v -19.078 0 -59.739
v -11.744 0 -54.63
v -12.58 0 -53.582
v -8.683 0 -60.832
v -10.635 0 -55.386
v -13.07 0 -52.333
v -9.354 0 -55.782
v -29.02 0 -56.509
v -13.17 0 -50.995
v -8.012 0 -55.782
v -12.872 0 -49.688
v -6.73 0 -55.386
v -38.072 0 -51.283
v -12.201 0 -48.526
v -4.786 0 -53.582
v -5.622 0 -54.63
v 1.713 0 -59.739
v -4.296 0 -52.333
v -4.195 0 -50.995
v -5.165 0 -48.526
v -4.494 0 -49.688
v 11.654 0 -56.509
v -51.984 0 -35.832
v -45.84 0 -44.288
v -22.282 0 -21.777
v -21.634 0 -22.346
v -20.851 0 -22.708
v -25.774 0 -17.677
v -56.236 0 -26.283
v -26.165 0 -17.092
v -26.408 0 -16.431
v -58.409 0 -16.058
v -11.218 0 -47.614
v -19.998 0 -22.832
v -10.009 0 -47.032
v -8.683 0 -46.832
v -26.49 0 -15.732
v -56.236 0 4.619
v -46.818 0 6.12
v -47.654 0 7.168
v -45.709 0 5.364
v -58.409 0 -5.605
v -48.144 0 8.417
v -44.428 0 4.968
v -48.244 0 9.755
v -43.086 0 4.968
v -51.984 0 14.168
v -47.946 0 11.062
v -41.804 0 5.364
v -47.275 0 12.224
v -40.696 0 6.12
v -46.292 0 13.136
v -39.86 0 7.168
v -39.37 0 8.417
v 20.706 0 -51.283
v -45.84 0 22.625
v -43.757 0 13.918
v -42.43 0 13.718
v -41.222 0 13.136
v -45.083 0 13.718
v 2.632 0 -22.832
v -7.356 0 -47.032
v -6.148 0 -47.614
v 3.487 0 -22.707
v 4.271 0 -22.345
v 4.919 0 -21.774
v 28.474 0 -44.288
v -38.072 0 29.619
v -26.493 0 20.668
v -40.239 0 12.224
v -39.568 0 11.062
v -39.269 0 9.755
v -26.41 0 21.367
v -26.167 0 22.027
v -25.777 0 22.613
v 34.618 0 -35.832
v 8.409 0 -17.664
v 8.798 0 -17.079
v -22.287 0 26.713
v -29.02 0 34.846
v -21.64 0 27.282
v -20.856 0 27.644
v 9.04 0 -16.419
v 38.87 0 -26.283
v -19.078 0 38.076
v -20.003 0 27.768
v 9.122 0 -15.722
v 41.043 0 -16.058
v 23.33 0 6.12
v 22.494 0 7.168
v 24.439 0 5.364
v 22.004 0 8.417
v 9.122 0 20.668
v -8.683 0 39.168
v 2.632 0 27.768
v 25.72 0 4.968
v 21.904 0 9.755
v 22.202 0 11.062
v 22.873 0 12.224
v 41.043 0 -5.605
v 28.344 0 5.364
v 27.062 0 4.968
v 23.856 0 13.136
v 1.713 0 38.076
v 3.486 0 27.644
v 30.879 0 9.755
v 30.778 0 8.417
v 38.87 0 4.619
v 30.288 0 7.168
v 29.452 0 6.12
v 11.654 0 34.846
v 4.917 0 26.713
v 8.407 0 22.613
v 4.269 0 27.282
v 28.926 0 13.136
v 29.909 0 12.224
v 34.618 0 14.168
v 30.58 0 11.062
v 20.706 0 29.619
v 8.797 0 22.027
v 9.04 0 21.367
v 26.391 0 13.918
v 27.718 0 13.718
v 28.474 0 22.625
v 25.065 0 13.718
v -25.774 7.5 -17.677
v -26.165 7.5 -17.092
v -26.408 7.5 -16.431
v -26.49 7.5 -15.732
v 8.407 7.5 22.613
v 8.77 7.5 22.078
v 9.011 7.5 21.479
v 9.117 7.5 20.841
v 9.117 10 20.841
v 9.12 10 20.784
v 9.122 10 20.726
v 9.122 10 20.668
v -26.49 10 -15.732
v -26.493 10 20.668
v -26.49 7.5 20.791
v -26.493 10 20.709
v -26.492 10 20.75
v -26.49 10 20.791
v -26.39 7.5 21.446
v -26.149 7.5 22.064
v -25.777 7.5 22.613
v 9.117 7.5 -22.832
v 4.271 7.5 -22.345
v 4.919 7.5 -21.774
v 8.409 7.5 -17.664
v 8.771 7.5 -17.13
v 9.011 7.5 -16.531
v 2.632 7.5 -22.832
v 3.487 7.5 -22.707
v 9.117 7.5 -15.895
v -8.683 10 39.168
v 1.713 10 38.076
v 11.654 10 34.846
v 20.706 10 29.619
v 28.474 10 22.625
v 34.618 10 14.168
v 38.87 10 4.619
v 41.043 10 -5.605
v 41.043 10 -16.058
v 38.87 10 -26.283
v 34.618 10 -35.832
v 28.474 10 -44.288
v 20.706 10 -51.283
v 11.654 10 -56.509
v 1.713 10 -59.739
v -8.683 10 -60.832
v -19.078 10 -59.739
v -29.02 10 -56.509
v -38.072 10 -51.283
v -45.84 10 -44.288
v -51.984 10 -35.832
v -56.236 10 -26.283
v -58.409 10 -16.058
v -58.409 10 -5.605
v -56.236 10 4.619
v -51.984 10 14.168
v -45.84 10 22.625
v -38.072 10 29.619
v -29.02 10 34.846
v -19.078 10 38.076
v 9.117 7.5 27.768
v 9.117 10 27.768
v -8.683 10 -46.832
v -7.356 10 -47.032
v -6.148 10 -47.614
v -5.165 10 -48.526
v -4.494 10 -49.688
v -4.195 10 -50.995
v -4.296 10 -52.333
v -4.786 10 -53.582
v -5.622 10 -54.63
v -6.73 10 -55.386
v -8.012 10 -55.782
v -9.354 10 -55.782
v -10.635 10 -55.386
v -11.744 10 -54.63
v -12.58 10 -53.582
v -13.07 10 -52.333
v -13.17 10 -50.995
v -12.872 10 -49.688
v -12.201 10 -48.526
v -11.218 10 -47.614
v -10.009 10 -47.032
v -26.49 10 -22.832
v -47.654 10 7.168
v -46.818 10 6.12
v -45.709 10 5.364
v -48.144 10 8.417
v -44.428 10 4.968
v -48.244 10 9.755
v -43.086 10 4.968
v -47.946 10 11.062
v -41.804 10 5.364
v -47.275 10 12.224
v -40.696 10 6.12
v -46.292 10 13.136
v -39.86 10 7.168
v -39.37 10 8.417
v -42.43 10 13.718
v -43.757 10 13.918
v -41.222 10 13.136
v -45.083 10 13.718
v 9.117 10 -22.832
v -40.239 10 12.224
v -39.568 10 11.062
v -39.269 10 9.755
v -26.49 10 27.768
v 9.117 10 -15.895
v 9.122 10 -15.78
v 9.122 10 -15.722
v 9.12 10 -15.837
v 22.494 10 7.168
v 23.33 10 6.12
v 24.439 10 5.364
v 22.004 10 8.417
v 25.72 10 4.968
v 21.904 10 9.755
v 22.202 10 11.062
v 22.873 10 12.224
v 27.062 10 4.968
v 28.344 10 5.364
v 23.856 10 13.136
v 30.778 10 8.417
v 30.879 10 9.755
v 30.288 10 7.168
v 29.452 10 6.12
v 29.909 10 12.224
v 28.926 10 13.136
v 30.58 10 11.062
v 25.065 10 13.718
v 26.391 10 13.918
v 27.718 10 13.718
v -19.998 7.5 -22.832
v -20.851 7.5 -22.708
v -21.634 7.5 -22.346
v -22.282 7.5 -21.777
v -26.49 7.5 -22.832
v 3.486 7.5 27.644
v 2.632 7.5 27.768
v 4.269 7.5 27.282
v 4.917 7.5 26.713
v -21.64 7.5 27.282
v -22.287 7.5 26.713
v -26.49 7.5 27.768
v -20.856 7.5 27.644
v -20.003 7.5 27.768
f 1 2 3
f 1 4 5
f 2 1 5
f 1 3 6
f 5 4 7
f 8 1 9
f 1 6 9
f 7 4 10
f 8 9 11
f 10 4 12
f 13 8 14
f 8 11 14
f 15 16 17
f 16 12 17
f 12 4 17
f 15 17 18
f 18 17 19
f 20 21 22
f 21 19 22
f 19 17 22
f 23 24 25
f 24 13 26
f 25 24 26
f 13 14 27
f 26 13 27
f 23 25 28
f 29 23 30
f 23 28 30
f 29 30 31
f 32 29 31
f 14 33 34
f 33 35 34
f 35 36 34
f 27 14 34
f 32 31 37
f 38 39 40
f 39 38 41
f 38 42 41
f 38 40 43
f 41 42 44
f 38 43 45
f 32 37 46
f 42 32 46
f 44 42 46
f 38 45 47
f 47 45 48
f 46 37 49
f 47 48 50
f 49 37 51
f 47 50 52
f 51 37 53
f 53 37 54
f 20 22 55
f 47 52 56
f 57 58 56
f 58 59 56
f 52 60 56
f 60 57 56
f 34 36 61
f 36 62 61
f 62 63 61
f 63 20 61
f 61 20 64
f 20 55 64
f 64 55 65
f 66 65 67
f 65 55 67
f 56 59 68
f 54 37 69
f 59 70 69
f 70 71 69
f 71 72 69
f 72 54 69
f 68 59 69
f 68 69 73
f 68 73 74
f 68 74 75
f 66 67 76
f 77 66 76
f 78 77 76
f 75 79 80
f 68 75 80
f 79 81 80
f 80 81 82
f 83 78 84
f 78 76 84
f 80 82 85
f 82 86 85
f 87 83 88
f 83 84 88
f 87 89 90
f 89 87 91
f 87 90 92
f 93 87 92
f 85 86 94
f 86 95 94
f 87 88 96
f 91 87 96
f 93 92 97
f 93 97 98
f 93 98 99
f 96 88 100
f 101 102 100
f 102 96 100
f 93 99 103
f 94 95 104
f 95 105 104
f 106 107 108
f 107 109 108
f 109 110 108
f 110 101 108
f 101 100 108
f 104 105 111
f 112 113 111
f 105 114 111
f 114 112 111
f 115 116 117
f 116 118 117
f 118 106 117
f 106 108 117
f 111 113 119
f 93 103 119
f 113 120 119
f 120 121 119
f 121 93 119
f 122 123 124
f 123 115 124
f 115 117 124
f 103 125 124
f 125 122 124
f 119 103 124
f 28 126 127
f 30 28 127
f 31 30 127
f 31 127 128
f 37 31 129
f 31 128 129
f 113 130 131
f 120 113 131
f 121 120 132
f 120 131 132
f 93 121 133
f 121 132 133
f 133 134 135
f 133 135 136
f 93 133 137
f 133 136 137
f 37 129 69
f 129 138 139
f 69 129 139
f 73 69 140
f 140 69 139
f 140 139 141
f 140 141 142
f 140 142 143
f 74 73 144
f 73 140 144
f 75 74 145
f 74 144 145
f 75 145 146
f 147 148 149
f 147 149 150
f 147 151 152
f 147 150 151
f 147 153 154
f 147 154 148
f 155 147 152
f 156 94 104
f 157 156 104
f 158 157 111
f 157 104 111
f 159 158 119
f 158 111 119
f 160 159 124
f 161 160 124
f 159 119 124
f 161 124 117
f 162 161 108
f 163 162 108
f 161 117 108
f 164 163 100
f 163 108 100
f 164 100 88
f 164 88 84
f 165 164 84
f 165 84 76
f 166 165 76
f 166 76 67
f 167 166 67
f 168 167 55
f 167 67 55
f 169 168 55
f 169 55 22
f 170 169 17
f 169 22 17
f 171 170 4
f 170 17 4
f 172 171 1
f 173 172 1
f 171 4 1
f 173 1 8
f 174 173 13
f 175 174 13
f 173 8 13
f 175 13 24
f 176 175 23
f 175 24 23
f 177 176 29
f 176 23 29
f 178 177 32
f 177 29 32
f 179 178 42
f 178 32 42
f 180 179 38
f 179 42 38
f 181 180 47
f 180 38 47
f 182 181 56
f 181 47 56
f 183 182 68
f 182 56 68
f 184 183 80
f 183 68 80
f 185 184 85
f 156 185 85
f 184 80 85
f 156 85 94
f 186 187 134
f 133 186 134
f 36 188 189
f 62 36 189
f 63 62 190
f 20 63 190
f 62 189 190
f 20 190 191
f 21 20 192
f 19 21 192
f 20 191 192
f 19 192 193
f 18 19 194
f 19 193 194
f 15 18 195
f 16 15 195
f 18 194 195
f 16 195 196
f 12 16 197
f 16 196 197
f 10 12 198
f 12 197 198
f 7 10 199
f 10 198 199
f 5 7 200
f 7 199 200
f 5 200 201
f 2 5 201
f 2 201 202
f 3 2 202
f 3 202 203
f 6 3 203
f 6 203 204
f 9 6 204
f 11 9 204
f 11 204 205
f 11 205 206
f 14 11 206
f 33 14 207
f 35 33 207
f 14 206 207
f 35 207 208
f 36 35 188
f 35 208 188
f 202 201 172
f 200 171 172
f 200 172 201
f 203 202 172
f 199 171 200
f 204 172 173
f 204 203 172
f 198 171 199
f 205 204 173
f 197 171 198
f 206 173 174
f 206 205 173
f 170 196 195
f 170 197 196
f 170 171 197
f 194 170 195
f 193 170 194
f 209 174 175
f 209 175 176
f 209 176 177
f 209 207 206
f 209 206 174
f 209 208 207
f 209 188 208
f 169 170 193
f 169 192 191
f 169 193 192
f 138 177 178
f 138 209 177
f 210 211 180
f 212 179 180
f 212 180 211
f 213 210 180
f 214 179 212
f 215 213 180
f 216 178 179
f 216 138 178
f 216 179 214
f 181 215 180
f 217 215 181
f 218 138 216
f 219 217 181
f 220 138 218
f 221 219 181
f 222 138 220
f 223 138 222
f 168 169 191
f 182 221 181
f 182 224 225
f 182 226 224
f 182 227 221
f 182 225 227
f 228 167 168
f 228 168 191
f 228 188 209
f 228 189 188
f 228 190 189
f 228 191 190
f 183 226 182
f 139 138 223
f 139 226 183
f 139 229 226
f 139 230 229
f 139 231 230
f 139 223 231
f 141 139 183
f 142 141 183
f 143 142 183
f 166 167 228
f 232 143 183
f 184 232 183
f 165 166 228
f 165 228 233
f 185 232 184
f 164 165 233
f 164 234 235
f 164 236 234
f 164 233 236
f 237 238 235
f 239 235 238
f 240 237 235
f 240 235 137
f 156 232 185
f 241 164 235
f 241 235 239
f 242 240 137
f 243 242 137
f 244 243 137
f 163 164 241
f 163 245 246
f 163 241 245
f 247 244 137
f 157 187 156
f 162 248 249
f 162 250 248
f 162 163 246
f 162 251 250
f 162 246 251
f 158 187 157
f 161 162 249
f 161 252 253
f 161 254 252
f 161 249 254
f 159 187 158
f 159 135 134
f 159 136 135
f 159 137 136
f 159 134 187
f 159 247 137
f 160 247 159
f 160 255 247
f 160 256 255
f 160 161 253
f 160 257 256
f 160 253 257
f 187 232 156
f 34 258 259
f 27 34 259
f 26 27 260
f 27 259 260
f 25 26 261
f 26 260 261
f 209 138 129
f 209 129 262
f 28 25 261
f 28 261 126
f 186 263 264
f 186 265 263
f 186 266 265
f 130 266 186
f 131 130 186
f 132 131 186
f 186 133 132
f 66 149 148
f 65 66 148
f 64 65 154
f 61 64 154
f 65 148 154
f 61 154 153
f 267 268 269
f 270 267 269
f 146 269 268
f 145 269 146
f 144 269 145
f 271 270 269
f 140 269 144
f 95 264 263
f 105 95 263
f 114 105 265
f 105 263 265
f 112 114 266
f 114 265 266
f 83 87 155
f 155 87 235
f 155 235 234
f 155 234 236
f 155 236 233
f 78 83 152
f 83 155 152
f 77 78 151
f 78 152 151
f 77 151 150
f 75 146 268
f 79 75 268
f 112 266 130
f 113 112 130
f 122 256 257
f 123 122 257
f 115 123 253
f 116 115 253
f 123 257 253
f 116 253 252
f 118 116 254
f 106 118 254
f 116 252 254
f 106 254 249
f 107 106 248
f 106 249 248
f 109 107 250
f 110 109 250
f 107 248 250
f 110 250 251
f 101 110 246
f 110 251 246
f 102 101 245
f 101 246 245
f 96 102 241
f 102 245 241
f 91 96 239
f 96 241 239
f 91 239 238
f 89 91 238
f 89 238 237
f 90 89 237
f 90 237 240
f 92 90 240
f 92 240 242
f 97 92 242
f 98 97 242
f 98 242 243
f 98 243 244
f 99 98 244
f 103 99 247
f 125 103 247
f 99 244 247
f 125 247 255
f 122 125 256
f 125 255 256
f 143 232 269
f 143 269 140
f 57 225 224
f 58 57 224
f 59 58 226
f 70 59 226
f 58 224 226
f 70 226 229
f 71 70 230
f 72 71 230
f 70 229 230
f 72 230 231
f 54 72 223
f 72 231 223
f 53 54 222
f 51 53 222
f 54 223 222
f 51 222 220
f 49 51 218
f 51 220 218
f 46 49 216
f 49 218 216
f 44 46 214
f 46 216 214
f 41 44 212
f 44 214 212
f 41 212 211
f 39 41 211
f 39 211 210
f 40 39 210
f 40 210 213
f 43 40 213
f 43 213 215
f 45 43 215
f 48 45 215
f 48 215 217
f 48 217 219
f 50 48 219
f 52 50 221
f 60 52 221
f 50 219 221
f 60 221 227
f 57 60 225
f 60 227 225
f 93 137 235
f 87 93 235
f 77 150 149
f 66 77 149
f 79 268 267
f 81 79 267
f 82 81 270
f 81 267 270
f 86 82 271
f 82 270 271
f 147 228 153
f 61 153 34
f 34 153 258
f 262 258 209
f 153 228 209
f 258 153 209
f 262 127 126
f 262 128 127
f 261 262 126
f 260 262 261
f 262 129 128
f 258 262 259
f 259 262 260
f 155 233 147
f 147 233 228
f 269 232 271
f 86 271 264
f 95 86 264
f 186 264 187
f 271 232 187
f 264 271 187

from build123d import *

# Parameters (mm, degrees)
SKETCH1_R           = 50
BOSS_EXTRUDE1_DEPTH = 10
CUT_EXTRUDE1_DEPTH  = 35
SKETCH5_W           = 35.6075
SKETCH5_H           = 50.6
CUT_EXTRUDE2_DEPTH  = 2.5
SKETCH7_R           = 4.5
CUT_EXTRUDE3_DEPTH  = 10
SKETCH7_3_R         = 4.5
CUT_EXTRUDE4_DEPTH  = 10
SKETCH7_4_R         = 4.5
CUT_EXTRUDE5_DEPTH  = 10


with BuildPart() as part:
    # Sketch1 → Boss-Extrude1 (new body)
    with BuildSketch(Plane(origin=(0, 0, 0), x_dir=(1, 0, 0), z_dir=(0, 1, 0))):
        with Locations((-8.682864084, 10.831764098)):
            Circle(SKETCH1_R)
    extrude(amount=BOSS_EXTRUDE1_DEPTH)

    # Sketch2 → Cut-Extrude1 (cut)
    with BuildSketch(Plane(origin=(0, 10, 0), x_dir=(1, 0, 0), z_dir=(0, 1, 0))):
        with BuildLine():
            Line((-20.002864084, -27.768235902), (2.632135916, -27.768235902))
            ThreePointArc((2.632135916, -27.768235902), (3.890371505, -27.491624086), (4.91657854, -26.712798037))
            Line((4.91657854, -26.712798037), (8.40657854, -22.612798037))
            ThreePointArc((8.40657854, -22.612798037), (8.937569086, -21.704255238), (9.122135916, -20.668235902))
            Line((9.122135916, -20.668235902), (9.122135916, 15.721764098))
            ThreePointArc((9.122135916, 15.721764098), (8.938191307, 16.756090949), (8.40891456, 17.663578567))
            Line((8.40891456, 17.663578567), (4.91891456, 21.773578567))
            ThreePointArc((4.91891456, 21.773578567), (3.892008249, 22.554395492), (2.632135916, 22.831764098))
            Line((2.632135916, 22.831764098), (-19.997864084, 22.831764098))
            ThreePointArc((-19.997864084, 22.831764098), (-21.255584517, 22.555390231), (-22.28157091, 21.777190306))
            Line((-22.28157091, 21.777190306), (-25.774070917, 17.677396608))
            ThreePointArc((-25.774070917, 17.677396608), (-26.30563684, 16.768425583), (-26.490364084, 15.731764356))
            Line((-26.490364084, 15.731764356), (-26.492864056, -20.667823814))
            ThreePointArc((-26.492864056, -20.667823814), (-26.308368402, -21.704061868), (-25.777306707, -22.612798037))
            Line((-25.777306707, -22.612798037), (-22.287306707, -26.712798037))
            ThreePointArc((-22.287306707, -26.712798037), (-21.261099672, -27.491624086), (-20.002864084, -27.768235902))
        make_face()
    extrude(amount=-CUT_EXTRUDE1_DEPTH, mode=Mode.SUBTRACT)

    # Sketch5 → Cut-Extrude2 (cut)
    with BuildSketch(Plane(origin=(0, 10, 0), x_dir=(1, 0, 0), z_dir=(0, 1, 0))):
        with Locations((-8.686614084, -2.468235902)):
            Rectangle(SKETCH5_W, SKETCH5_H)
    extrude(amount=-CUT_EXTRUDE2_DEPTH, mode=Mode.SUBTRACT)

    # Sketch7 → Cut-Extrude3 (cut)
    with BuildSketch(Plane(origin=(0, 10, 0), x_dir=(1, 0, 0), z_dir=(0, 1, 0))):
        with Locations((26.391164769, -9.418235902)):
            Circle(SKETCH7_R)
    extrude(amount=-CUT_EXTRUDE3_DEPTH, mode=Mode.SUBTRACT)

    # Sketch7<3> → Cut-Extrude4 (cut)
    with BuildSketch(Plane(origin=(0, 10, 0), x_dir=(1, 0, 0), z_dir=(0, 1, 0))):
        with Locations((-43.756892937, -9.418235902)):
            Circle(SKETCH7_3_R)
    extrude(amount=-CUT_EXTRUDE4_DEPTH, mode=Mode.SUBTRACT)

    # Sketch7<4> → Cut-Extrude5 (cut)
    with BuildSketch(Plane(origin=(0, 10, 0), x_dir=(1, 0, 0), z_dir=(0, 1, 0))):
        with Locations((-8.682864084, 51.331764098)):
            Circle(SKETCH7_4_R)
    extrude(amount=-CUT_EXTRUDE5_DEPTH, mode=Mode.SUBTRACT)


solid = part.part
